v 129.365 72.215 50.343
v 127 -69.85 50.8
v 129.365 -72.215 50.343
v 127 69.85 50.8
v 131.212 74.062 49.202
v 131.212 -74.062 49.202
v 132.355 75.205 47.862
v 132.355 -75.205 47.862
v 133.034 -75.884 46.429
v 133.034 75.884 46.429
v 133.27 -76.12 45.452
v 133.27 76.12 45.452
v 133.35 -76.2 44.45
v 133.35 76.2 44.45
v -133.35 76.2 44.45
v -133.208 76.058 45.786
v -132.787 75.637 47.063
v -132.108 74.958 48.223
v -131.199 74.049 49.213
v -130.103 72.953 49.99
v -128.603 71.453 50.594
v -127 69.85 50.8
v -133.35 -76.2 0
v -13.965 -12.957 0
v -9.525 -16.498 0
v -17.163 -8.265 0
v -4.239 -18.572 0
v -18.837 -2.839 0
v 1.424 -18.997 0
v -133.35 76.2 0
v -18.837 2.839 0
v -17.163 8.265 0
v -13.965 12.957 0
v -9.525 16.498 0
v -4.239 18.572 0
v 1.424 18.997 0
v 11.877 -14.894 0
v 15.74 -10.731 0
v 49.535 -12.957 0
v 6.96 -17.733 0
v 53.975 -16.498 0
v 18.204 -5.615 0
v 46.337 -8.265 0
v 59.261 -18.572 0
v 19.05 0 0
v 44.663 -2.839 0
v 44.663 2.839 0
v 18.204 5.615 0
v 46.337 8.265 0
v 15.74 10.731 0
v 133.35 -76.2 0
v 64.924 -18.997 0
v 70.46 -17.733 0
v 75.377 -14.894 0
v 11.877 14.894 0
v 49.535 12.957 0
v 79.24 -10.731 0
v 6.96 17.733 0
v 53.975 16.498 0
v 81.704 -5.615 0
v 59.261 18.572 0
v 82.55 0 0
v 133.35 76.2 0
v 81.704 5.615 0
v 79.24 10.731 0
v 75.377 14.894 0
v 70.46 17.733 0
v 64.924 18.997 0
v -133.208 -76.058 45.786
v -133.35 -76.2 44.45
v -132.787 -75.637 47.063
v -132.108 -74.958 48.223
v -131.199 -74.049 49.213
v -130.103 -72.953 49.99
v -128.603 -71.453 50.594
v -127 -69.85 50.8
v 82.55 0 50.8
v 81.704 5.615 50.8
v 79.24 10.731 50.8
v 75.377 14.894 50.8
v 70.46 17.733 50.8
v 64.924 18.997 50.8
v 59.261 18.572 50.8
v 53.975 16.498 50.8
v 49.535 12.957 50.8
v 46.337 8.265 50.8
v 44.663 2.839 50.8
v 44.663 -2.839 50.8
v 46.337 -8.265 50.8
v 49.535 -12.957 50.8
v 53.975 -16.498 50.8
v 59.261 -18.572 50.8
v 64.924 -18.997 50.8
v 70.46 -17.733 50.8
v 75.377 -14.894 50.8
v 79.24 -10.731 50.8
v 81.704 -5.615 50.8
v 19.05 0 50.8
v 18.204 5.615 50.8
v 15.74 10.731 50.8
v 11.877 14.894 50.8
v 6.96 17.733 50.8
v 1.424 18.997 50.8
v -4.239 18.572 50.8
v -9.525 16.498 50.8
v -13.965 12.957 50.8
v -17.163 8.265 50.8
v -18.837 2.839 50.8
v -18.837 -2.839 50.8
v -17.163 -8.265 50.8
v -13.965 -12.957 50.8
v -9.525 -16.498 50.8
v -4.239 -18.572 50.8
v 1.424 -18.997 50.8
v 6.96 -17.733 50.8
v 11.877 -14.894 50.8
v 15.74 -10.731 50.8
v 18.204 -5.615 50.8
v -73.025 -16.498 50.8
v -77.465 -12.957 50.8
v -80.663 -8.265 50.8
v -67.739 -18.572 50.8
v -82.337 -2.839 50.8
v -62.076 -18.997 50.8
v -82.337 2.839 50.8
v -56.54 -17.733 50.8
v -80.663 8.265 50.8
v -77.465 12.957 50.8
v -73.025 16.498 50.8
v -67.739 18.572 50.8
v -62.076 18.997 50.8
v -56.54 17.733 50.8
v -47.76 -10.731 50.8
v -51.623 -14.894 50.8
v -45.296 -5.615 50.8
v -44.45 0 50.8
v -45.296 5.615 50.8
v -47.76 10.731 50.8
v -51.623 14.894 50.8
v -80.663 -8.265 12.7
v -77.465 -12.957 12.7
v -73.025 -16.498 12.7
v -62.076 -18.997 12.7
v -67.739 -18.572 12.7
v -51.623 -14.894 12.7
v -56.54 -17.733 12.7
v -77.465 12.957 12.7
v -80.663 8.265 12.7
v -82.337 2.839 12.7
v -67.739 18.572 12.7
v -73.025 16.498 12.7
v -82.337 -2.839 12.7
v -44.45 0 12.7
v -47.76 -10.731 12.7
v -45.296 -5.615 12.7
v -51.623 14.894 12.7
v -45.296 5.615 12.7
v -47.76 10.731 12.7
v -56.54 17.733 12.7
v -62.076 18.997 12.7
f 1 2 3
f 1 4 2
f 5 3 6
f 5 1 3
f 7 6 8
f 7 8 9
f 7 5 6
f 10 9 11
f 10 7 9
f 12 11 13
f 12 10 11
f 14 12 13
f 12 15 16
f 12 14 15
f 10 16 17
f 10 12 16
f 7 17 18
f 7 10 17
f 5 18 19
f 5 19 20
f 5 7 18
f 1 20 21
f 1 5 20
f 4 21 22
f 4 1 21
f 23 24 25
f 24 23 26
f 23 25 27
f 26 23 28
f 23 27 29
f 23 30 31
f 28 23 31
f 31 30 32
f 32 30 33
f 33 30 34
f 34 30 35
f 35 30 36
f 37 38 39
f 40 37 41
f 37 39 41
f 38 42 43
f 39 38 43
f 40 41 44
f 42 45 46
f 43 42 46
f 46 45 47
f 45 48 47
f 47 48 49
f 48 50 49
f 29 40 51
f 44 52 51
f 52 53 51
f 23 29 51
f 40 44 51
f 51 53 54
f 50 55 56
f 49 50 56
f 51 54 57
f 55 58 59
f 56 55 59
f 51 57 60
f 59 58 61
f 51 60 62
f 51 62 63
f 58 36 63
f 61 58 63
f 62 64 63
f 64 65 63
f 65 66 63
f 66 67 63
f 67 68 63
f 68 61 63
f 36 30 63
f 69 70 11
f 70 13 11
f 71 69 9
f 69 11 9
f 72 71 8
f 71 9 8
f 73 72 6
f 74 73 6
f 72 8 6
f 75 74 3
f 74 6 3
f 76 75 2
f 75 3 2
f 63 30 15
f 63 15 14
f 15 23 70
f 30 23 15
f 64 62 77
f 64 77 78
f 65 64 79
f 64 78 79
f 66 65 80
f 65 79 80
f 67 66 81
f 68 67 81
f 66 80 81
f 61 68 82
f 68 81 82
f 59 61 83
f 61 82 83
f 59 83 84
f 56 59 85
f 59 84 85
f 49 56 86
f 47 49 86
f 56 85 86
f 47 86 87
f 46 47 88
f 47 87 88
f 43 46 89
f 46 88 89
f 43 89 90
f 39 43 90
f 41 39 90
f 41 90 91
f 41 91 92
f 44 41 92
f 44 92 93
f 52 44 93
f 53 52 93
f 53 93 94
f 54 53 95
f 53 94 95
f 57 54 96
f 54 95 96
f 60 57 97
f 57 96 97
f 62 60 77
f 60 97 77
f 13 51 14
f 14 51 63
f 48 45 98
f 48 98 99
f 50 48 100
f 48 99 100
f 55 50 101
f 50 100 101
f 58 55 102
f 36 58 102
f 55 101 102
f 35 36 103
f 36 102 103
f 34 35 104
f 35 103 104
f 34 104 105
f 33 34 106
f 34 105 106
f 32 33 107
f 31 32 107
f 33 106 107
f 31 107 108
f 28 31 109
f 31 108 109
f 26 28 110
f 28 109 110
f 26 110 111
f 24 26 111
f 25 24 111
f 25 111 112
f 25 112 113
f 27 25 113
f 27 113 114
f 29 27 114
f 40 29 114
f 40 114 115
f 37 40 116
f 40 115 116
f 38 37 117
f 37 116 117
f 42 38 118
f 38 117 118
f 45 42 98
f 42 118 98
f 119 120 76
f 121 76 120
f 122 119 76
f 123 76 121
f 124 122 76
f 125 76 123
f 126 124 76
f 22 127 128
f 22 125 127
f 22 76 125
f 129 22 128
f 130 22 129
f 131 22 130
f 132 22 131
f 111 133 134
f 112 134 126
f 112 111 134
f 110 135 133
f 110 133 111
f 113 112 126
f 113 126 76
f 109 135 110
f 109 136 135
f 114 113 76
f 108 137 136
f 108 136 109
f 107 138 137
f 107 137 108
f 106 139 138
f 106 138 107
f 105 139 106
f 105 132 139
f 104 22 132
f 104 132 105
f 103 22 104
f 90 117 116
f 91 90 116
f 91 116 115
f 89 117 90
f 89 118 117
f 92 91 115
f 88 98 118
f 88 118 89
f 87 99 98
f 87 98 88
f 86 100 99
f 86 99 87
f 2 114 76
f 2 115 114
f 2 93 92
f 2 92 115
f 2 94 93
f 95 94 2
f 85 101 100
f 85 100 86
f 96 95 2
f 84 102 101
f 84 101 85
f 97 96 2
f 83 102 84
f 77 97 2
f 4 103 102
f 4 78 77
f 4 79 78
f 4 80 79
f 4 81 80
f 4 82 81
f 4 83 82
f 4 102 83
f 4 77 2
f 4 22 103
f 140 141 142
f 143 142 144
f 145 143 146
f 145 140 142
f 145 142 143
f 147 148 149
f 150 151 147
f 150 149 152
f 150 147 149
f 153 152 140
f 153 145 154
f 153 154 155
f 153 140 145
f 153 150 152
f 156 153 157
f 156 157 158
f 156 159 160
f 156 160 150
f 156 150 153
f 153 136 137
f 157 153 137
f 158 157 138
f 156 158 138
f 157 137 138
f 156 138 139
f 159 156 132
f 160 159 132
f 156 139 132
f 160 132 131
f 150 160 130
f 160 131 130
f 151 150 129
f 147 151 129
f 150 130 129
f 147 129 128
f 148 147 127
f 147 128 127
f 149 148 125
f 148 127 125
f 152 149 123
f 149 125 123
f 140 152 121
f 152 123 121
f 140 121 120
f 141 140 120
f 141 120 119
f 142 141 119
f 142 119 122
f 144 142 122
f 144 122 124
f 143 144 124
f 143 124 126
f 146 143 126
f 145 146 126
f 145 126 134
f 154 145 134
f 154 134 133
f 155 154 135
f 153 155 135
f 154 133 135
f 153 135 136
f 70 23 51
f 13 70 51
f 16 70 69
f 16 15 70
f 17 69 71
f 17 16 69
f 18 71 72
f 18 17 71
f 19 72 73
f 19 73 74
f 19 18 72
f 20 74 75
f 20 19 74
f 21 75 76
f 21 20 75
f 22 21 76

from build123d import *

# Parameters (mm, degrees)
F0_W      = 266.7
F0_H      = 152.4
F1_DEPTH  = 50.8
F2_R      = 19.05
F3_DEPTH  = 38.1
F4_R      = 6.35
F3_FACE_R = 19.05
F5_DEPTH  = 50.8


with BuildPart() as f1:
    # F0 (on Top) → F1 (new body)
    with BuildSketch(Plane.XY):
        Rectangle(F0_W, F0_H)
    extrude(amount=F1_DEPTH)

    # F2 (on face) → F3 (cut)
    with BuildSketch(Plane.XY.offset(50.8)):
        with Locations((-63.5, 0)):
            Circle(F2_R)
        Circle(F2_R)
        with Locations((63.5, 0)):
            Circle(F2_R)
    extrude(amount=-F3_DEPTH, mode=Mode.SUBTRACT)

    # F4
    f4_edges = [f1.edges().sort_by_distance(p)[0] for p in [
        (133.35, 0, 50.8),
        (0, 76.2, 50.8),
        (0, -76.2, 50.8),
        (-133.35, 0, 50.8),
    ]]
    fillet(f4_edges, radius=F4_R)

    # F3_face (on face) → F5 (cut)
    with BuildSketch(Plane.XY.offset(12.7)):
        Circle(F3_FACE_R)
        with Locations((63.5, 0)):
            Circle(F3_FACE_R)
    extrude(amount=-F5_DEPTH, mode=Mode.SUBTRACT)


solid = f1.part
